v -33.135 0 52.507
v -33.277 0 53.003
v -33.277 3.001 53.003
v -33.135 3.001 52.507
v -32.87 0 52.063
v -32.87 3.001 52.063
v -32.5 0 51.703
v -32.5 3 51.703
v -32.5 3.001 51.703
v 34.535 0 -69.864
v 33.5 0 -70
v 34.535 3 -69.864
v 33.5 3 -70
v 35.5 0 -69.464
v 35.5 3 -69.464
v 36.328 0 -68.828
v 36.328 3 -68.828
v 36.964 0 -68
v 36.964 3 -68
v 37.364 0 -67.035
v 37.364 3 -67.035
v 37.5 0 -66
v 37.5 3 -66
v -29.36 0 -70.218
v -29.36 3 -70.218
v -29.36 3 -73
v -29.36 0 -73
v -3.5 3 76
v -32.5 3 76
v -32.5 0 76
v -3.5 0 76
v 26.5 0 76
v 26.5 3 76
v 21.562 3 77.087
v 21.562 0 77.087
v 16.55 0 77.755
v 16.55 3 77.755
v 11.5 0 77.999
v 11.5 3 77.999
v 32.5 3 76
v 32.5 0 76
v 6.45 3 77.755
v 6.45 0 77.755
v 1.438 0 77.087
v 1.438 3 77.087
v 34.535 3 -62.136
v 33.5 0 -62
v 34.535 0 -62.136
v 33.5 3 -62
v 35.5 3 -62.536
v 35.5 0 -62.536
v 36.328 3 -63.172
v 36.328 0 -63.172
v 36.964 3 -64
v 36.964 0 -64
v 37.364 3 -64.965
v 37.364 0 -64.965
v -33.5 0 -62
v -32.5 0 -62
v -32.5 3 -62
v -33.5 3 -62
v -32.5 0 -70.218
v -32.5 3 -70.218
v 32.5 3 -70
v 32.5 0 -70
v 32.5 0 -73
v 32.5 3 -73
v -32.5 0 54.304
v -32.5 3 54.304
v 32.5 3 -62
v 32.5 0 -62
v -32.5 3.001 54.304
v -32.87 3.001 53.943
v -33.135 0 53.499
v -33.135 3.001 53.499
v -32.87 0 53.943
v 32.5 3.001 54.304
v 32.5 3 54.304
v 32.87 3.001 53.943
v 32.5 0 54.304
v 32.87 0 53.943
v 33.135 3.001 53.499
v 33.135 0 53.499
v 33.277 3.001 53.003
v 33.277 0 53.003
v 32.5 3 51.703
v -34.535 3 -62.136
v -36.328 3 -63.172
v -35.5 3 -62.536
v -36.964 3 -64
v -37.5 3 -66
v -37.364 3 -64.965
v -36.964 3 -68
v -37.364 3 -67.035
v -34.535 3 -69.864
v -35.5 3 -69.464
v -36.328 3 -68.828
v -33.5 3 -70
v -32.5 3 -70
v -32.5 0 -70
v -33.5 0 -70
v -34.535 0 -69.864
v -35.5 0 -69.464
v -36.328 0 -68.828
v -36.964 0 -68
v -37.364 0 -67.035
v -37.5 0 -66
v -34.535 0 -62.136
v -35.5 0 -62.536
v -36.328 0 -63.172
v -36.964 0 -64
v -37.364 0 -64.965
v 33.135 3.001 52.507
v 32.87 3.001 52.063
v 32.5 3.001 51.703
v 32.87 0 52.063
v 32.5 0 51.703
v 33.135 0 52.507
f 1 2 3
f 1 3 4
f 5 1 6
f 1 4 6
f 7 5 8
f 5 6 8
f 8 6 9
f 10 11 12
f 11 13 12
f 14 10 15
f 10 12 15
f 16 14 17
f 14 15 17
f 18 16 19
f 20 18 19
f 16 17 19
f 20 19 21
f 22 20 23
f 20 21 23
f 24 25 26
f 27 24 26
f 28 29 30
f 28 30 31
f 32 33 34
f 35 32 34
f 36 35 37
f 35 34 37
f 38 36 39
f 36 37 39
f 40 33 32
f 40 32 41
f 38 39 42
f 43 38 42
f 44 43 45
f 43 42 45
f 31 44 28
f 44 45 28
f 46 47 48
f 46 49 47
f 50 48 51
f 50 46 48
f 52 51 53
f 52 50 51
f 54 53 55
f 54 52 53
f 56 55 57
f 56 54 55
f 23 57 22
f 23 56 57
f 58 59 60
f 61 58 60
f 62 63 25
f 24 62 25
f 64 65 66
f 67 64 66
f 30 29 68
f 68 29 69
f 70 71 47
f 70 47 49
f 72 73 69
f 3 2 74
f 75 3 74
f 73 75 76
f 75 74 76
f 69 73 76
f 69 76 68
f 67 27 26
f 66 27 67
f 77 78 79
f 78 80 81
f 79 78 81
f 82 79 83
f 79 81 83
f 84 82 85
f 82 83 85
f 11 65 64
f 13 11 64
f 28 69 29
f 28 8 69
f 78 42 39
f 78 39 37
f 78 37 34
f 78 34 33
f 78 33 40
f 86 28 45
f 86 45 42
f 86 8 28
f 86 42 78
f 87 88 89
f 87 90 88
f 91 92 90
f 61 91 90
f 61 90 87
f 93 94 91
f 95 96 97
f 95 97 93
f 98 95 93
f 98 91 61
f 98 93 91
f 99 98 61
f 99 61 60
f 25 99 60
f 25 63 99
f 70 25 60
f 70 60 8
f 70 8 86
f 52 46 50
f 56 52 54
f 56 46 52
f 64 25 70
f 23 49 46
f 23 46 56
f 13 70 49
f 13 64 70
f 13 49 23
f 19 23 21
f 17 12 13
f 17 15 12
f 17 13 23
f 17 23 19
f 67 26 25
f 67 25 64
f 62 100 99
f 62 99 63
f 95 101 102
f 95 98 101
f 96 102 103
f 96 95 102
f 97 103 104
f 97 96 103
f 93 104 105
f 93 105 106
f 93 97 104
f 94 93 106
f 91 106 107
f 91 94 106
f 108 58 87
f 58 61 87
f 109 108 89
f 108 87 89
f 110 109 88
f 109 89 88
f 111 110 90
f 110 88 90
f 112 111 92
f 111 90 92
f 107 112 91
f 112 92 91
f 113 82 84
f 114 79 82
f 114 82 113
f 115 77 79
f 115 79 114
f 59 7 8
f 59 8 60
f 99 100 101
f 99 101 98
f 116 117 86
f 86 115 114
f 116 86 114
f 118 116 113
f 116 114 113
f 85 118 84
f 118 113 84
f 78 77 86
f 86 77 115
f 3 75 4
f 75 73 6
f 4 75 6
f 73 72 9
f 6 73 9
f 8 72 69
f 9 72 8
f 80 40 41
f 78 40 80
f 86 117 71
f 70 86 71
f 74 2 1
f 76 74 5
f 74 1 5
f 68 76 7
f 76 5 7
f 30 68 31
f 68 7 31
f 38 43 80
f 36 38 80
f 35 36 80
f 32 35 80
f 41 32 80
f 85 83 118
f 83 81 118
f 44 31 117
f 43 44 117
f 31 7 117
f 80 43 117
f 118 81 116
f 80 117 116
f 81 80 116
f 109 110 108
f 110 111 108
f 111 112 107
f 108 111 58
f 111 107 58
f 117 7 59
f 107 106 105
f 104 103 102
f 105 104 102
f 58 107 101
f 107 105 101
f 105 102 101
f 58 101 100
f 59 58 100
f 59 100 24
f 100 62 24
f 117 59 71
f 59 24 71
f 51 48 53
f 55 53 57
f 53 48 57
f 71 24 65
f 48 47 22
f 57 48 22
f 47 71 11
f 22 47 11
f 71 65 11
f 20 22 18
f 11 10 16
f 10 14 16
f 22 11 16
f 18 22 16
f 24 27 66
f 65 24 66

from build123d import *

# Parameters (mm, degrees)
CROQUIS1_W               = 65
CROQUIS1_H               = 146
SALIENTE_EXTRUIR1_DEPTH  = 3
CROQUIS2_W               = 8
CROQUIS2_H               = 3
SALIENTE_EXTRUIR2_DEPTH  = 5
REDONDEO1_R              = 4
REDONDEO1_OF_SIMETR_A1_R = 4
CROQUIS3_W               = 2.60095456
CROQUIS3_H               = 3.001101416
SALIENTE_EXTRUIR3_DEPTH  = 0.8
REDONDEO2_R              = 2
REDONDEO2_OF_SIMETR_A5_R = 2
CROQUIS4_W               = 65
CROQUIS4_H               = 3
CROQUIS4_W_2             = 30
CROQUIS4_H_2             = 2
SALIENTE_EXTRUIR4_DEPTH  = 3
REDONDEO3_R              = 60
CROQUIS6_W               = 3.139643751
CROQUIS6_H               = 2.781946526
CORTAR_EXTRUIR1_DEPTH    = 10


# Some blends are built 0.0001 mm under size
with BuildPart() as part:
    # Croquis1 → Saliente-Extruir1 (new body)
    with BuildSketch(Plane(origin=(0, 0, 0), x_dir=(1, 0, 0), z_dir=(0, 1, 0))):
        Rectangle(CROQUIS1_W, CROQUIS1_H)
    extrude(amount=SALIENTE_EXTRUIR1_DEPTH)

    # Croquis2 → Saliente-Extruir2 (add)
    with BuildSketch(Plane(origin=(32.5, 0, 0), x_dir=(0, 0, -1), z_dir=(1, 0, 0))):
        with Locations((66, 1.5)):
            Rectangle(CROQUIS2_W, CROQUIS2_H)
    saliente_extruir2 = extrude(amount=SALIENTE_EXTRUIR2_DEPTH)

    # Redondeo1
    redondeo1_edges = [part.edges().sort_by_distance(p)[0] for p in [
        (37.5, 1.5, -62),
        (37.5, 1.5, -70),
    ]]
    fillet(redondeo1_edges, radius=REDONDEO1_R - 0.0001)  # a hair under: the kernel refuses the full size

    # Simetría1: Saliente-Extruir2 across plane
    add(saliente_extruir2.mirror(Plane(origin=(0, 0, 0), x_dir=(0, 0, 1), z_dir=(1, 0, 0))))

    # Redondeo1 of Simetría1
    redondeo1_of_simetr_a1_edges = [part.edges().sort_by_distance(p)[0] for p in [
        (-37.5, 1.5, -62),
        (-37.5, 1.5, -70),
    ]]
    fillet(redondeo1_of_simetr_a1_edges, radius=REDONDEO1_OF_SIMETR_A1_R - 0.0001)  # a hair under: the kernel refuses the full size

    # Croquis3 → Saliente-Extruir3 (add)
    with BuildSketch(Plane(origin=(32.5, 0, 0), x_dir=(0, 0, -1), z_dir=(1, 0, 0))):
        with Locations((-53.003039433, 1.500550708)):
            Rectangle(CROQUIS3_W, CROQUIS3_H)
    saliente_extruir3 = extrude(amount=SALIENTE_EXTRUIR3_DEPTH)

    # Redondeo2
    # the kernel refuses this fillet: 2 mm, written as the material it takes off along each edge
    with BuildSketch(Plane(origin=(33.3, 7.001101416, 51.702562153), x_dir=(-1, 0, 0), z_dir=(0, -1, 0)), Plane(origin=(33.3, -4, 54.303516713), x_dir=(-1, 0, 0), z_dir=(0, 1, 0))) as redondeo2_piece_1:
        with BuildLine():
            CenterArc((2, -1.6), REDONDEO2_R, 126.869897646, 53.130102354)
            Line((0, -1.6), (-0.04, -1.6))
            Line((-0.04, -1.6), (-0.04, 0))
            Line((-0.04, 0), (0, 0.04))
            ThreePointArc((0, 0.04), (0.4, 0.04), (0.776, 0.032))
            Line((0.776, 0.032), (0.8, 0))
        make_face()
    extrude(amount=11.001101416, mode=Mode.SUBTRACT)

    # Simetría5: Saliente-Extruir3 across plane
    add(saliente_extruir3.mirror(Plane(origin=(0, 0, 0), x_dir=(0, 0, 1), z_dir=(1, 0, 0))))

    # Redondeo2 of Simetría5
    # the kernel refuses this fillet: 2 mm, written as the material it takes off along each edge
    with BuildSketch(Plane(origin=(-33.3, 7.001101416, 51.702562153), x_dir=(1, 0, 0), z_dir=(0, -1, 0)), Plane(origin=(-33.3, -4, 54.303516713), x_dir=(1, 0, 0), z_dir=(0, 1, 0))) as redondeo2_of_simetr_a5_piece_1:
        with BuildLine():
            CenterArc((2, 1.6), REDONDEO2_OF_SIMETR_A5_R, 180, 53.130102354)
            Line((0, 1.6), (-0.04, 1.6))
            Line((-0.04, 1.6), (-0.04, 0))
            Line((-0.04, 0), (0, -0.04))
            ThreePointArc((0, -0.04), (0.4, -0.04), (0.776, -0.032))
            Line((0.776, -0.032), (0.8, 0))
        make_face()
    extrude(amount=11.001101416, mode=Mode.SUBTRACT)

    # Croquis4 → Saliente-Extruir4 (add)
    with BuildSketch(Plane(origin=(0, 3, 0), x_dir=(1, 0, 0), z_dir=(0, 1, 0))):
        with Locations((0, -74.5)):
            Rectangle(CROQUIS4_W, CROQUIS4_H)
        with Locations((11.5, -77)):
            Rectangle(CROQUIS4_W_2, CROQUIS4_H_2)
    extrude(amount=-SALIENTE_EXTRUIR4_DEPTH)

    # Redondeo3
    # the kernel refuses this fillet: 60 mm, written as the material it takes off along each edge
    with BuildSketch(Plane(origin=(26.5, 41.405728739, 78), x_dir=(0, 0, -1), z_dir=(0, -1, 0))) as redondeo3_piece_1:
        with BuildLine():
            CenterArc((60, -15.362291496), REDONDEO3_R, 165.164888418, 14.835111582)
            Line((0, -15.362291496), (0, 0))
            Line((0, 0), (2, 0))
        make_face()
    extrude(amount=79.811457479, mode=Mode.SUBTRACT)
    with BuildSketch(Plane(origin=(-3.5, 41.405728739, 78), x_dir=(1, 0, 0), z_dir=(0, -1, 0))) as redondeo3_piece_2:
        with BuildLine():
            CenterArc((15.362291496, -60), REDONDEO3_R, 90, 14.835111582)
            Line((0, -2), (0, 0))
            Line((0, 0), (15.362291496, 0))
        make_face()
    extrude(amount=79.811457479, mode=Mode.SUBTRACT)

    # Croquis6 → Cortar-Extruir1 (cut)
    with BuildSketch(Plane(origin=(0, 3, 0), x_dir=(1, 0, 0), z_dir=(0, 1, 0))):
        with Locations((-30.930178125, 71.609026737)):
            Rectangle(CROQUIS6_W, CROQUIS6_H)
    extrude(amount=-CORTAR_EXTRUIR1_DEPTH, mode=Mode.SUBTRACT)


solid = part.part
